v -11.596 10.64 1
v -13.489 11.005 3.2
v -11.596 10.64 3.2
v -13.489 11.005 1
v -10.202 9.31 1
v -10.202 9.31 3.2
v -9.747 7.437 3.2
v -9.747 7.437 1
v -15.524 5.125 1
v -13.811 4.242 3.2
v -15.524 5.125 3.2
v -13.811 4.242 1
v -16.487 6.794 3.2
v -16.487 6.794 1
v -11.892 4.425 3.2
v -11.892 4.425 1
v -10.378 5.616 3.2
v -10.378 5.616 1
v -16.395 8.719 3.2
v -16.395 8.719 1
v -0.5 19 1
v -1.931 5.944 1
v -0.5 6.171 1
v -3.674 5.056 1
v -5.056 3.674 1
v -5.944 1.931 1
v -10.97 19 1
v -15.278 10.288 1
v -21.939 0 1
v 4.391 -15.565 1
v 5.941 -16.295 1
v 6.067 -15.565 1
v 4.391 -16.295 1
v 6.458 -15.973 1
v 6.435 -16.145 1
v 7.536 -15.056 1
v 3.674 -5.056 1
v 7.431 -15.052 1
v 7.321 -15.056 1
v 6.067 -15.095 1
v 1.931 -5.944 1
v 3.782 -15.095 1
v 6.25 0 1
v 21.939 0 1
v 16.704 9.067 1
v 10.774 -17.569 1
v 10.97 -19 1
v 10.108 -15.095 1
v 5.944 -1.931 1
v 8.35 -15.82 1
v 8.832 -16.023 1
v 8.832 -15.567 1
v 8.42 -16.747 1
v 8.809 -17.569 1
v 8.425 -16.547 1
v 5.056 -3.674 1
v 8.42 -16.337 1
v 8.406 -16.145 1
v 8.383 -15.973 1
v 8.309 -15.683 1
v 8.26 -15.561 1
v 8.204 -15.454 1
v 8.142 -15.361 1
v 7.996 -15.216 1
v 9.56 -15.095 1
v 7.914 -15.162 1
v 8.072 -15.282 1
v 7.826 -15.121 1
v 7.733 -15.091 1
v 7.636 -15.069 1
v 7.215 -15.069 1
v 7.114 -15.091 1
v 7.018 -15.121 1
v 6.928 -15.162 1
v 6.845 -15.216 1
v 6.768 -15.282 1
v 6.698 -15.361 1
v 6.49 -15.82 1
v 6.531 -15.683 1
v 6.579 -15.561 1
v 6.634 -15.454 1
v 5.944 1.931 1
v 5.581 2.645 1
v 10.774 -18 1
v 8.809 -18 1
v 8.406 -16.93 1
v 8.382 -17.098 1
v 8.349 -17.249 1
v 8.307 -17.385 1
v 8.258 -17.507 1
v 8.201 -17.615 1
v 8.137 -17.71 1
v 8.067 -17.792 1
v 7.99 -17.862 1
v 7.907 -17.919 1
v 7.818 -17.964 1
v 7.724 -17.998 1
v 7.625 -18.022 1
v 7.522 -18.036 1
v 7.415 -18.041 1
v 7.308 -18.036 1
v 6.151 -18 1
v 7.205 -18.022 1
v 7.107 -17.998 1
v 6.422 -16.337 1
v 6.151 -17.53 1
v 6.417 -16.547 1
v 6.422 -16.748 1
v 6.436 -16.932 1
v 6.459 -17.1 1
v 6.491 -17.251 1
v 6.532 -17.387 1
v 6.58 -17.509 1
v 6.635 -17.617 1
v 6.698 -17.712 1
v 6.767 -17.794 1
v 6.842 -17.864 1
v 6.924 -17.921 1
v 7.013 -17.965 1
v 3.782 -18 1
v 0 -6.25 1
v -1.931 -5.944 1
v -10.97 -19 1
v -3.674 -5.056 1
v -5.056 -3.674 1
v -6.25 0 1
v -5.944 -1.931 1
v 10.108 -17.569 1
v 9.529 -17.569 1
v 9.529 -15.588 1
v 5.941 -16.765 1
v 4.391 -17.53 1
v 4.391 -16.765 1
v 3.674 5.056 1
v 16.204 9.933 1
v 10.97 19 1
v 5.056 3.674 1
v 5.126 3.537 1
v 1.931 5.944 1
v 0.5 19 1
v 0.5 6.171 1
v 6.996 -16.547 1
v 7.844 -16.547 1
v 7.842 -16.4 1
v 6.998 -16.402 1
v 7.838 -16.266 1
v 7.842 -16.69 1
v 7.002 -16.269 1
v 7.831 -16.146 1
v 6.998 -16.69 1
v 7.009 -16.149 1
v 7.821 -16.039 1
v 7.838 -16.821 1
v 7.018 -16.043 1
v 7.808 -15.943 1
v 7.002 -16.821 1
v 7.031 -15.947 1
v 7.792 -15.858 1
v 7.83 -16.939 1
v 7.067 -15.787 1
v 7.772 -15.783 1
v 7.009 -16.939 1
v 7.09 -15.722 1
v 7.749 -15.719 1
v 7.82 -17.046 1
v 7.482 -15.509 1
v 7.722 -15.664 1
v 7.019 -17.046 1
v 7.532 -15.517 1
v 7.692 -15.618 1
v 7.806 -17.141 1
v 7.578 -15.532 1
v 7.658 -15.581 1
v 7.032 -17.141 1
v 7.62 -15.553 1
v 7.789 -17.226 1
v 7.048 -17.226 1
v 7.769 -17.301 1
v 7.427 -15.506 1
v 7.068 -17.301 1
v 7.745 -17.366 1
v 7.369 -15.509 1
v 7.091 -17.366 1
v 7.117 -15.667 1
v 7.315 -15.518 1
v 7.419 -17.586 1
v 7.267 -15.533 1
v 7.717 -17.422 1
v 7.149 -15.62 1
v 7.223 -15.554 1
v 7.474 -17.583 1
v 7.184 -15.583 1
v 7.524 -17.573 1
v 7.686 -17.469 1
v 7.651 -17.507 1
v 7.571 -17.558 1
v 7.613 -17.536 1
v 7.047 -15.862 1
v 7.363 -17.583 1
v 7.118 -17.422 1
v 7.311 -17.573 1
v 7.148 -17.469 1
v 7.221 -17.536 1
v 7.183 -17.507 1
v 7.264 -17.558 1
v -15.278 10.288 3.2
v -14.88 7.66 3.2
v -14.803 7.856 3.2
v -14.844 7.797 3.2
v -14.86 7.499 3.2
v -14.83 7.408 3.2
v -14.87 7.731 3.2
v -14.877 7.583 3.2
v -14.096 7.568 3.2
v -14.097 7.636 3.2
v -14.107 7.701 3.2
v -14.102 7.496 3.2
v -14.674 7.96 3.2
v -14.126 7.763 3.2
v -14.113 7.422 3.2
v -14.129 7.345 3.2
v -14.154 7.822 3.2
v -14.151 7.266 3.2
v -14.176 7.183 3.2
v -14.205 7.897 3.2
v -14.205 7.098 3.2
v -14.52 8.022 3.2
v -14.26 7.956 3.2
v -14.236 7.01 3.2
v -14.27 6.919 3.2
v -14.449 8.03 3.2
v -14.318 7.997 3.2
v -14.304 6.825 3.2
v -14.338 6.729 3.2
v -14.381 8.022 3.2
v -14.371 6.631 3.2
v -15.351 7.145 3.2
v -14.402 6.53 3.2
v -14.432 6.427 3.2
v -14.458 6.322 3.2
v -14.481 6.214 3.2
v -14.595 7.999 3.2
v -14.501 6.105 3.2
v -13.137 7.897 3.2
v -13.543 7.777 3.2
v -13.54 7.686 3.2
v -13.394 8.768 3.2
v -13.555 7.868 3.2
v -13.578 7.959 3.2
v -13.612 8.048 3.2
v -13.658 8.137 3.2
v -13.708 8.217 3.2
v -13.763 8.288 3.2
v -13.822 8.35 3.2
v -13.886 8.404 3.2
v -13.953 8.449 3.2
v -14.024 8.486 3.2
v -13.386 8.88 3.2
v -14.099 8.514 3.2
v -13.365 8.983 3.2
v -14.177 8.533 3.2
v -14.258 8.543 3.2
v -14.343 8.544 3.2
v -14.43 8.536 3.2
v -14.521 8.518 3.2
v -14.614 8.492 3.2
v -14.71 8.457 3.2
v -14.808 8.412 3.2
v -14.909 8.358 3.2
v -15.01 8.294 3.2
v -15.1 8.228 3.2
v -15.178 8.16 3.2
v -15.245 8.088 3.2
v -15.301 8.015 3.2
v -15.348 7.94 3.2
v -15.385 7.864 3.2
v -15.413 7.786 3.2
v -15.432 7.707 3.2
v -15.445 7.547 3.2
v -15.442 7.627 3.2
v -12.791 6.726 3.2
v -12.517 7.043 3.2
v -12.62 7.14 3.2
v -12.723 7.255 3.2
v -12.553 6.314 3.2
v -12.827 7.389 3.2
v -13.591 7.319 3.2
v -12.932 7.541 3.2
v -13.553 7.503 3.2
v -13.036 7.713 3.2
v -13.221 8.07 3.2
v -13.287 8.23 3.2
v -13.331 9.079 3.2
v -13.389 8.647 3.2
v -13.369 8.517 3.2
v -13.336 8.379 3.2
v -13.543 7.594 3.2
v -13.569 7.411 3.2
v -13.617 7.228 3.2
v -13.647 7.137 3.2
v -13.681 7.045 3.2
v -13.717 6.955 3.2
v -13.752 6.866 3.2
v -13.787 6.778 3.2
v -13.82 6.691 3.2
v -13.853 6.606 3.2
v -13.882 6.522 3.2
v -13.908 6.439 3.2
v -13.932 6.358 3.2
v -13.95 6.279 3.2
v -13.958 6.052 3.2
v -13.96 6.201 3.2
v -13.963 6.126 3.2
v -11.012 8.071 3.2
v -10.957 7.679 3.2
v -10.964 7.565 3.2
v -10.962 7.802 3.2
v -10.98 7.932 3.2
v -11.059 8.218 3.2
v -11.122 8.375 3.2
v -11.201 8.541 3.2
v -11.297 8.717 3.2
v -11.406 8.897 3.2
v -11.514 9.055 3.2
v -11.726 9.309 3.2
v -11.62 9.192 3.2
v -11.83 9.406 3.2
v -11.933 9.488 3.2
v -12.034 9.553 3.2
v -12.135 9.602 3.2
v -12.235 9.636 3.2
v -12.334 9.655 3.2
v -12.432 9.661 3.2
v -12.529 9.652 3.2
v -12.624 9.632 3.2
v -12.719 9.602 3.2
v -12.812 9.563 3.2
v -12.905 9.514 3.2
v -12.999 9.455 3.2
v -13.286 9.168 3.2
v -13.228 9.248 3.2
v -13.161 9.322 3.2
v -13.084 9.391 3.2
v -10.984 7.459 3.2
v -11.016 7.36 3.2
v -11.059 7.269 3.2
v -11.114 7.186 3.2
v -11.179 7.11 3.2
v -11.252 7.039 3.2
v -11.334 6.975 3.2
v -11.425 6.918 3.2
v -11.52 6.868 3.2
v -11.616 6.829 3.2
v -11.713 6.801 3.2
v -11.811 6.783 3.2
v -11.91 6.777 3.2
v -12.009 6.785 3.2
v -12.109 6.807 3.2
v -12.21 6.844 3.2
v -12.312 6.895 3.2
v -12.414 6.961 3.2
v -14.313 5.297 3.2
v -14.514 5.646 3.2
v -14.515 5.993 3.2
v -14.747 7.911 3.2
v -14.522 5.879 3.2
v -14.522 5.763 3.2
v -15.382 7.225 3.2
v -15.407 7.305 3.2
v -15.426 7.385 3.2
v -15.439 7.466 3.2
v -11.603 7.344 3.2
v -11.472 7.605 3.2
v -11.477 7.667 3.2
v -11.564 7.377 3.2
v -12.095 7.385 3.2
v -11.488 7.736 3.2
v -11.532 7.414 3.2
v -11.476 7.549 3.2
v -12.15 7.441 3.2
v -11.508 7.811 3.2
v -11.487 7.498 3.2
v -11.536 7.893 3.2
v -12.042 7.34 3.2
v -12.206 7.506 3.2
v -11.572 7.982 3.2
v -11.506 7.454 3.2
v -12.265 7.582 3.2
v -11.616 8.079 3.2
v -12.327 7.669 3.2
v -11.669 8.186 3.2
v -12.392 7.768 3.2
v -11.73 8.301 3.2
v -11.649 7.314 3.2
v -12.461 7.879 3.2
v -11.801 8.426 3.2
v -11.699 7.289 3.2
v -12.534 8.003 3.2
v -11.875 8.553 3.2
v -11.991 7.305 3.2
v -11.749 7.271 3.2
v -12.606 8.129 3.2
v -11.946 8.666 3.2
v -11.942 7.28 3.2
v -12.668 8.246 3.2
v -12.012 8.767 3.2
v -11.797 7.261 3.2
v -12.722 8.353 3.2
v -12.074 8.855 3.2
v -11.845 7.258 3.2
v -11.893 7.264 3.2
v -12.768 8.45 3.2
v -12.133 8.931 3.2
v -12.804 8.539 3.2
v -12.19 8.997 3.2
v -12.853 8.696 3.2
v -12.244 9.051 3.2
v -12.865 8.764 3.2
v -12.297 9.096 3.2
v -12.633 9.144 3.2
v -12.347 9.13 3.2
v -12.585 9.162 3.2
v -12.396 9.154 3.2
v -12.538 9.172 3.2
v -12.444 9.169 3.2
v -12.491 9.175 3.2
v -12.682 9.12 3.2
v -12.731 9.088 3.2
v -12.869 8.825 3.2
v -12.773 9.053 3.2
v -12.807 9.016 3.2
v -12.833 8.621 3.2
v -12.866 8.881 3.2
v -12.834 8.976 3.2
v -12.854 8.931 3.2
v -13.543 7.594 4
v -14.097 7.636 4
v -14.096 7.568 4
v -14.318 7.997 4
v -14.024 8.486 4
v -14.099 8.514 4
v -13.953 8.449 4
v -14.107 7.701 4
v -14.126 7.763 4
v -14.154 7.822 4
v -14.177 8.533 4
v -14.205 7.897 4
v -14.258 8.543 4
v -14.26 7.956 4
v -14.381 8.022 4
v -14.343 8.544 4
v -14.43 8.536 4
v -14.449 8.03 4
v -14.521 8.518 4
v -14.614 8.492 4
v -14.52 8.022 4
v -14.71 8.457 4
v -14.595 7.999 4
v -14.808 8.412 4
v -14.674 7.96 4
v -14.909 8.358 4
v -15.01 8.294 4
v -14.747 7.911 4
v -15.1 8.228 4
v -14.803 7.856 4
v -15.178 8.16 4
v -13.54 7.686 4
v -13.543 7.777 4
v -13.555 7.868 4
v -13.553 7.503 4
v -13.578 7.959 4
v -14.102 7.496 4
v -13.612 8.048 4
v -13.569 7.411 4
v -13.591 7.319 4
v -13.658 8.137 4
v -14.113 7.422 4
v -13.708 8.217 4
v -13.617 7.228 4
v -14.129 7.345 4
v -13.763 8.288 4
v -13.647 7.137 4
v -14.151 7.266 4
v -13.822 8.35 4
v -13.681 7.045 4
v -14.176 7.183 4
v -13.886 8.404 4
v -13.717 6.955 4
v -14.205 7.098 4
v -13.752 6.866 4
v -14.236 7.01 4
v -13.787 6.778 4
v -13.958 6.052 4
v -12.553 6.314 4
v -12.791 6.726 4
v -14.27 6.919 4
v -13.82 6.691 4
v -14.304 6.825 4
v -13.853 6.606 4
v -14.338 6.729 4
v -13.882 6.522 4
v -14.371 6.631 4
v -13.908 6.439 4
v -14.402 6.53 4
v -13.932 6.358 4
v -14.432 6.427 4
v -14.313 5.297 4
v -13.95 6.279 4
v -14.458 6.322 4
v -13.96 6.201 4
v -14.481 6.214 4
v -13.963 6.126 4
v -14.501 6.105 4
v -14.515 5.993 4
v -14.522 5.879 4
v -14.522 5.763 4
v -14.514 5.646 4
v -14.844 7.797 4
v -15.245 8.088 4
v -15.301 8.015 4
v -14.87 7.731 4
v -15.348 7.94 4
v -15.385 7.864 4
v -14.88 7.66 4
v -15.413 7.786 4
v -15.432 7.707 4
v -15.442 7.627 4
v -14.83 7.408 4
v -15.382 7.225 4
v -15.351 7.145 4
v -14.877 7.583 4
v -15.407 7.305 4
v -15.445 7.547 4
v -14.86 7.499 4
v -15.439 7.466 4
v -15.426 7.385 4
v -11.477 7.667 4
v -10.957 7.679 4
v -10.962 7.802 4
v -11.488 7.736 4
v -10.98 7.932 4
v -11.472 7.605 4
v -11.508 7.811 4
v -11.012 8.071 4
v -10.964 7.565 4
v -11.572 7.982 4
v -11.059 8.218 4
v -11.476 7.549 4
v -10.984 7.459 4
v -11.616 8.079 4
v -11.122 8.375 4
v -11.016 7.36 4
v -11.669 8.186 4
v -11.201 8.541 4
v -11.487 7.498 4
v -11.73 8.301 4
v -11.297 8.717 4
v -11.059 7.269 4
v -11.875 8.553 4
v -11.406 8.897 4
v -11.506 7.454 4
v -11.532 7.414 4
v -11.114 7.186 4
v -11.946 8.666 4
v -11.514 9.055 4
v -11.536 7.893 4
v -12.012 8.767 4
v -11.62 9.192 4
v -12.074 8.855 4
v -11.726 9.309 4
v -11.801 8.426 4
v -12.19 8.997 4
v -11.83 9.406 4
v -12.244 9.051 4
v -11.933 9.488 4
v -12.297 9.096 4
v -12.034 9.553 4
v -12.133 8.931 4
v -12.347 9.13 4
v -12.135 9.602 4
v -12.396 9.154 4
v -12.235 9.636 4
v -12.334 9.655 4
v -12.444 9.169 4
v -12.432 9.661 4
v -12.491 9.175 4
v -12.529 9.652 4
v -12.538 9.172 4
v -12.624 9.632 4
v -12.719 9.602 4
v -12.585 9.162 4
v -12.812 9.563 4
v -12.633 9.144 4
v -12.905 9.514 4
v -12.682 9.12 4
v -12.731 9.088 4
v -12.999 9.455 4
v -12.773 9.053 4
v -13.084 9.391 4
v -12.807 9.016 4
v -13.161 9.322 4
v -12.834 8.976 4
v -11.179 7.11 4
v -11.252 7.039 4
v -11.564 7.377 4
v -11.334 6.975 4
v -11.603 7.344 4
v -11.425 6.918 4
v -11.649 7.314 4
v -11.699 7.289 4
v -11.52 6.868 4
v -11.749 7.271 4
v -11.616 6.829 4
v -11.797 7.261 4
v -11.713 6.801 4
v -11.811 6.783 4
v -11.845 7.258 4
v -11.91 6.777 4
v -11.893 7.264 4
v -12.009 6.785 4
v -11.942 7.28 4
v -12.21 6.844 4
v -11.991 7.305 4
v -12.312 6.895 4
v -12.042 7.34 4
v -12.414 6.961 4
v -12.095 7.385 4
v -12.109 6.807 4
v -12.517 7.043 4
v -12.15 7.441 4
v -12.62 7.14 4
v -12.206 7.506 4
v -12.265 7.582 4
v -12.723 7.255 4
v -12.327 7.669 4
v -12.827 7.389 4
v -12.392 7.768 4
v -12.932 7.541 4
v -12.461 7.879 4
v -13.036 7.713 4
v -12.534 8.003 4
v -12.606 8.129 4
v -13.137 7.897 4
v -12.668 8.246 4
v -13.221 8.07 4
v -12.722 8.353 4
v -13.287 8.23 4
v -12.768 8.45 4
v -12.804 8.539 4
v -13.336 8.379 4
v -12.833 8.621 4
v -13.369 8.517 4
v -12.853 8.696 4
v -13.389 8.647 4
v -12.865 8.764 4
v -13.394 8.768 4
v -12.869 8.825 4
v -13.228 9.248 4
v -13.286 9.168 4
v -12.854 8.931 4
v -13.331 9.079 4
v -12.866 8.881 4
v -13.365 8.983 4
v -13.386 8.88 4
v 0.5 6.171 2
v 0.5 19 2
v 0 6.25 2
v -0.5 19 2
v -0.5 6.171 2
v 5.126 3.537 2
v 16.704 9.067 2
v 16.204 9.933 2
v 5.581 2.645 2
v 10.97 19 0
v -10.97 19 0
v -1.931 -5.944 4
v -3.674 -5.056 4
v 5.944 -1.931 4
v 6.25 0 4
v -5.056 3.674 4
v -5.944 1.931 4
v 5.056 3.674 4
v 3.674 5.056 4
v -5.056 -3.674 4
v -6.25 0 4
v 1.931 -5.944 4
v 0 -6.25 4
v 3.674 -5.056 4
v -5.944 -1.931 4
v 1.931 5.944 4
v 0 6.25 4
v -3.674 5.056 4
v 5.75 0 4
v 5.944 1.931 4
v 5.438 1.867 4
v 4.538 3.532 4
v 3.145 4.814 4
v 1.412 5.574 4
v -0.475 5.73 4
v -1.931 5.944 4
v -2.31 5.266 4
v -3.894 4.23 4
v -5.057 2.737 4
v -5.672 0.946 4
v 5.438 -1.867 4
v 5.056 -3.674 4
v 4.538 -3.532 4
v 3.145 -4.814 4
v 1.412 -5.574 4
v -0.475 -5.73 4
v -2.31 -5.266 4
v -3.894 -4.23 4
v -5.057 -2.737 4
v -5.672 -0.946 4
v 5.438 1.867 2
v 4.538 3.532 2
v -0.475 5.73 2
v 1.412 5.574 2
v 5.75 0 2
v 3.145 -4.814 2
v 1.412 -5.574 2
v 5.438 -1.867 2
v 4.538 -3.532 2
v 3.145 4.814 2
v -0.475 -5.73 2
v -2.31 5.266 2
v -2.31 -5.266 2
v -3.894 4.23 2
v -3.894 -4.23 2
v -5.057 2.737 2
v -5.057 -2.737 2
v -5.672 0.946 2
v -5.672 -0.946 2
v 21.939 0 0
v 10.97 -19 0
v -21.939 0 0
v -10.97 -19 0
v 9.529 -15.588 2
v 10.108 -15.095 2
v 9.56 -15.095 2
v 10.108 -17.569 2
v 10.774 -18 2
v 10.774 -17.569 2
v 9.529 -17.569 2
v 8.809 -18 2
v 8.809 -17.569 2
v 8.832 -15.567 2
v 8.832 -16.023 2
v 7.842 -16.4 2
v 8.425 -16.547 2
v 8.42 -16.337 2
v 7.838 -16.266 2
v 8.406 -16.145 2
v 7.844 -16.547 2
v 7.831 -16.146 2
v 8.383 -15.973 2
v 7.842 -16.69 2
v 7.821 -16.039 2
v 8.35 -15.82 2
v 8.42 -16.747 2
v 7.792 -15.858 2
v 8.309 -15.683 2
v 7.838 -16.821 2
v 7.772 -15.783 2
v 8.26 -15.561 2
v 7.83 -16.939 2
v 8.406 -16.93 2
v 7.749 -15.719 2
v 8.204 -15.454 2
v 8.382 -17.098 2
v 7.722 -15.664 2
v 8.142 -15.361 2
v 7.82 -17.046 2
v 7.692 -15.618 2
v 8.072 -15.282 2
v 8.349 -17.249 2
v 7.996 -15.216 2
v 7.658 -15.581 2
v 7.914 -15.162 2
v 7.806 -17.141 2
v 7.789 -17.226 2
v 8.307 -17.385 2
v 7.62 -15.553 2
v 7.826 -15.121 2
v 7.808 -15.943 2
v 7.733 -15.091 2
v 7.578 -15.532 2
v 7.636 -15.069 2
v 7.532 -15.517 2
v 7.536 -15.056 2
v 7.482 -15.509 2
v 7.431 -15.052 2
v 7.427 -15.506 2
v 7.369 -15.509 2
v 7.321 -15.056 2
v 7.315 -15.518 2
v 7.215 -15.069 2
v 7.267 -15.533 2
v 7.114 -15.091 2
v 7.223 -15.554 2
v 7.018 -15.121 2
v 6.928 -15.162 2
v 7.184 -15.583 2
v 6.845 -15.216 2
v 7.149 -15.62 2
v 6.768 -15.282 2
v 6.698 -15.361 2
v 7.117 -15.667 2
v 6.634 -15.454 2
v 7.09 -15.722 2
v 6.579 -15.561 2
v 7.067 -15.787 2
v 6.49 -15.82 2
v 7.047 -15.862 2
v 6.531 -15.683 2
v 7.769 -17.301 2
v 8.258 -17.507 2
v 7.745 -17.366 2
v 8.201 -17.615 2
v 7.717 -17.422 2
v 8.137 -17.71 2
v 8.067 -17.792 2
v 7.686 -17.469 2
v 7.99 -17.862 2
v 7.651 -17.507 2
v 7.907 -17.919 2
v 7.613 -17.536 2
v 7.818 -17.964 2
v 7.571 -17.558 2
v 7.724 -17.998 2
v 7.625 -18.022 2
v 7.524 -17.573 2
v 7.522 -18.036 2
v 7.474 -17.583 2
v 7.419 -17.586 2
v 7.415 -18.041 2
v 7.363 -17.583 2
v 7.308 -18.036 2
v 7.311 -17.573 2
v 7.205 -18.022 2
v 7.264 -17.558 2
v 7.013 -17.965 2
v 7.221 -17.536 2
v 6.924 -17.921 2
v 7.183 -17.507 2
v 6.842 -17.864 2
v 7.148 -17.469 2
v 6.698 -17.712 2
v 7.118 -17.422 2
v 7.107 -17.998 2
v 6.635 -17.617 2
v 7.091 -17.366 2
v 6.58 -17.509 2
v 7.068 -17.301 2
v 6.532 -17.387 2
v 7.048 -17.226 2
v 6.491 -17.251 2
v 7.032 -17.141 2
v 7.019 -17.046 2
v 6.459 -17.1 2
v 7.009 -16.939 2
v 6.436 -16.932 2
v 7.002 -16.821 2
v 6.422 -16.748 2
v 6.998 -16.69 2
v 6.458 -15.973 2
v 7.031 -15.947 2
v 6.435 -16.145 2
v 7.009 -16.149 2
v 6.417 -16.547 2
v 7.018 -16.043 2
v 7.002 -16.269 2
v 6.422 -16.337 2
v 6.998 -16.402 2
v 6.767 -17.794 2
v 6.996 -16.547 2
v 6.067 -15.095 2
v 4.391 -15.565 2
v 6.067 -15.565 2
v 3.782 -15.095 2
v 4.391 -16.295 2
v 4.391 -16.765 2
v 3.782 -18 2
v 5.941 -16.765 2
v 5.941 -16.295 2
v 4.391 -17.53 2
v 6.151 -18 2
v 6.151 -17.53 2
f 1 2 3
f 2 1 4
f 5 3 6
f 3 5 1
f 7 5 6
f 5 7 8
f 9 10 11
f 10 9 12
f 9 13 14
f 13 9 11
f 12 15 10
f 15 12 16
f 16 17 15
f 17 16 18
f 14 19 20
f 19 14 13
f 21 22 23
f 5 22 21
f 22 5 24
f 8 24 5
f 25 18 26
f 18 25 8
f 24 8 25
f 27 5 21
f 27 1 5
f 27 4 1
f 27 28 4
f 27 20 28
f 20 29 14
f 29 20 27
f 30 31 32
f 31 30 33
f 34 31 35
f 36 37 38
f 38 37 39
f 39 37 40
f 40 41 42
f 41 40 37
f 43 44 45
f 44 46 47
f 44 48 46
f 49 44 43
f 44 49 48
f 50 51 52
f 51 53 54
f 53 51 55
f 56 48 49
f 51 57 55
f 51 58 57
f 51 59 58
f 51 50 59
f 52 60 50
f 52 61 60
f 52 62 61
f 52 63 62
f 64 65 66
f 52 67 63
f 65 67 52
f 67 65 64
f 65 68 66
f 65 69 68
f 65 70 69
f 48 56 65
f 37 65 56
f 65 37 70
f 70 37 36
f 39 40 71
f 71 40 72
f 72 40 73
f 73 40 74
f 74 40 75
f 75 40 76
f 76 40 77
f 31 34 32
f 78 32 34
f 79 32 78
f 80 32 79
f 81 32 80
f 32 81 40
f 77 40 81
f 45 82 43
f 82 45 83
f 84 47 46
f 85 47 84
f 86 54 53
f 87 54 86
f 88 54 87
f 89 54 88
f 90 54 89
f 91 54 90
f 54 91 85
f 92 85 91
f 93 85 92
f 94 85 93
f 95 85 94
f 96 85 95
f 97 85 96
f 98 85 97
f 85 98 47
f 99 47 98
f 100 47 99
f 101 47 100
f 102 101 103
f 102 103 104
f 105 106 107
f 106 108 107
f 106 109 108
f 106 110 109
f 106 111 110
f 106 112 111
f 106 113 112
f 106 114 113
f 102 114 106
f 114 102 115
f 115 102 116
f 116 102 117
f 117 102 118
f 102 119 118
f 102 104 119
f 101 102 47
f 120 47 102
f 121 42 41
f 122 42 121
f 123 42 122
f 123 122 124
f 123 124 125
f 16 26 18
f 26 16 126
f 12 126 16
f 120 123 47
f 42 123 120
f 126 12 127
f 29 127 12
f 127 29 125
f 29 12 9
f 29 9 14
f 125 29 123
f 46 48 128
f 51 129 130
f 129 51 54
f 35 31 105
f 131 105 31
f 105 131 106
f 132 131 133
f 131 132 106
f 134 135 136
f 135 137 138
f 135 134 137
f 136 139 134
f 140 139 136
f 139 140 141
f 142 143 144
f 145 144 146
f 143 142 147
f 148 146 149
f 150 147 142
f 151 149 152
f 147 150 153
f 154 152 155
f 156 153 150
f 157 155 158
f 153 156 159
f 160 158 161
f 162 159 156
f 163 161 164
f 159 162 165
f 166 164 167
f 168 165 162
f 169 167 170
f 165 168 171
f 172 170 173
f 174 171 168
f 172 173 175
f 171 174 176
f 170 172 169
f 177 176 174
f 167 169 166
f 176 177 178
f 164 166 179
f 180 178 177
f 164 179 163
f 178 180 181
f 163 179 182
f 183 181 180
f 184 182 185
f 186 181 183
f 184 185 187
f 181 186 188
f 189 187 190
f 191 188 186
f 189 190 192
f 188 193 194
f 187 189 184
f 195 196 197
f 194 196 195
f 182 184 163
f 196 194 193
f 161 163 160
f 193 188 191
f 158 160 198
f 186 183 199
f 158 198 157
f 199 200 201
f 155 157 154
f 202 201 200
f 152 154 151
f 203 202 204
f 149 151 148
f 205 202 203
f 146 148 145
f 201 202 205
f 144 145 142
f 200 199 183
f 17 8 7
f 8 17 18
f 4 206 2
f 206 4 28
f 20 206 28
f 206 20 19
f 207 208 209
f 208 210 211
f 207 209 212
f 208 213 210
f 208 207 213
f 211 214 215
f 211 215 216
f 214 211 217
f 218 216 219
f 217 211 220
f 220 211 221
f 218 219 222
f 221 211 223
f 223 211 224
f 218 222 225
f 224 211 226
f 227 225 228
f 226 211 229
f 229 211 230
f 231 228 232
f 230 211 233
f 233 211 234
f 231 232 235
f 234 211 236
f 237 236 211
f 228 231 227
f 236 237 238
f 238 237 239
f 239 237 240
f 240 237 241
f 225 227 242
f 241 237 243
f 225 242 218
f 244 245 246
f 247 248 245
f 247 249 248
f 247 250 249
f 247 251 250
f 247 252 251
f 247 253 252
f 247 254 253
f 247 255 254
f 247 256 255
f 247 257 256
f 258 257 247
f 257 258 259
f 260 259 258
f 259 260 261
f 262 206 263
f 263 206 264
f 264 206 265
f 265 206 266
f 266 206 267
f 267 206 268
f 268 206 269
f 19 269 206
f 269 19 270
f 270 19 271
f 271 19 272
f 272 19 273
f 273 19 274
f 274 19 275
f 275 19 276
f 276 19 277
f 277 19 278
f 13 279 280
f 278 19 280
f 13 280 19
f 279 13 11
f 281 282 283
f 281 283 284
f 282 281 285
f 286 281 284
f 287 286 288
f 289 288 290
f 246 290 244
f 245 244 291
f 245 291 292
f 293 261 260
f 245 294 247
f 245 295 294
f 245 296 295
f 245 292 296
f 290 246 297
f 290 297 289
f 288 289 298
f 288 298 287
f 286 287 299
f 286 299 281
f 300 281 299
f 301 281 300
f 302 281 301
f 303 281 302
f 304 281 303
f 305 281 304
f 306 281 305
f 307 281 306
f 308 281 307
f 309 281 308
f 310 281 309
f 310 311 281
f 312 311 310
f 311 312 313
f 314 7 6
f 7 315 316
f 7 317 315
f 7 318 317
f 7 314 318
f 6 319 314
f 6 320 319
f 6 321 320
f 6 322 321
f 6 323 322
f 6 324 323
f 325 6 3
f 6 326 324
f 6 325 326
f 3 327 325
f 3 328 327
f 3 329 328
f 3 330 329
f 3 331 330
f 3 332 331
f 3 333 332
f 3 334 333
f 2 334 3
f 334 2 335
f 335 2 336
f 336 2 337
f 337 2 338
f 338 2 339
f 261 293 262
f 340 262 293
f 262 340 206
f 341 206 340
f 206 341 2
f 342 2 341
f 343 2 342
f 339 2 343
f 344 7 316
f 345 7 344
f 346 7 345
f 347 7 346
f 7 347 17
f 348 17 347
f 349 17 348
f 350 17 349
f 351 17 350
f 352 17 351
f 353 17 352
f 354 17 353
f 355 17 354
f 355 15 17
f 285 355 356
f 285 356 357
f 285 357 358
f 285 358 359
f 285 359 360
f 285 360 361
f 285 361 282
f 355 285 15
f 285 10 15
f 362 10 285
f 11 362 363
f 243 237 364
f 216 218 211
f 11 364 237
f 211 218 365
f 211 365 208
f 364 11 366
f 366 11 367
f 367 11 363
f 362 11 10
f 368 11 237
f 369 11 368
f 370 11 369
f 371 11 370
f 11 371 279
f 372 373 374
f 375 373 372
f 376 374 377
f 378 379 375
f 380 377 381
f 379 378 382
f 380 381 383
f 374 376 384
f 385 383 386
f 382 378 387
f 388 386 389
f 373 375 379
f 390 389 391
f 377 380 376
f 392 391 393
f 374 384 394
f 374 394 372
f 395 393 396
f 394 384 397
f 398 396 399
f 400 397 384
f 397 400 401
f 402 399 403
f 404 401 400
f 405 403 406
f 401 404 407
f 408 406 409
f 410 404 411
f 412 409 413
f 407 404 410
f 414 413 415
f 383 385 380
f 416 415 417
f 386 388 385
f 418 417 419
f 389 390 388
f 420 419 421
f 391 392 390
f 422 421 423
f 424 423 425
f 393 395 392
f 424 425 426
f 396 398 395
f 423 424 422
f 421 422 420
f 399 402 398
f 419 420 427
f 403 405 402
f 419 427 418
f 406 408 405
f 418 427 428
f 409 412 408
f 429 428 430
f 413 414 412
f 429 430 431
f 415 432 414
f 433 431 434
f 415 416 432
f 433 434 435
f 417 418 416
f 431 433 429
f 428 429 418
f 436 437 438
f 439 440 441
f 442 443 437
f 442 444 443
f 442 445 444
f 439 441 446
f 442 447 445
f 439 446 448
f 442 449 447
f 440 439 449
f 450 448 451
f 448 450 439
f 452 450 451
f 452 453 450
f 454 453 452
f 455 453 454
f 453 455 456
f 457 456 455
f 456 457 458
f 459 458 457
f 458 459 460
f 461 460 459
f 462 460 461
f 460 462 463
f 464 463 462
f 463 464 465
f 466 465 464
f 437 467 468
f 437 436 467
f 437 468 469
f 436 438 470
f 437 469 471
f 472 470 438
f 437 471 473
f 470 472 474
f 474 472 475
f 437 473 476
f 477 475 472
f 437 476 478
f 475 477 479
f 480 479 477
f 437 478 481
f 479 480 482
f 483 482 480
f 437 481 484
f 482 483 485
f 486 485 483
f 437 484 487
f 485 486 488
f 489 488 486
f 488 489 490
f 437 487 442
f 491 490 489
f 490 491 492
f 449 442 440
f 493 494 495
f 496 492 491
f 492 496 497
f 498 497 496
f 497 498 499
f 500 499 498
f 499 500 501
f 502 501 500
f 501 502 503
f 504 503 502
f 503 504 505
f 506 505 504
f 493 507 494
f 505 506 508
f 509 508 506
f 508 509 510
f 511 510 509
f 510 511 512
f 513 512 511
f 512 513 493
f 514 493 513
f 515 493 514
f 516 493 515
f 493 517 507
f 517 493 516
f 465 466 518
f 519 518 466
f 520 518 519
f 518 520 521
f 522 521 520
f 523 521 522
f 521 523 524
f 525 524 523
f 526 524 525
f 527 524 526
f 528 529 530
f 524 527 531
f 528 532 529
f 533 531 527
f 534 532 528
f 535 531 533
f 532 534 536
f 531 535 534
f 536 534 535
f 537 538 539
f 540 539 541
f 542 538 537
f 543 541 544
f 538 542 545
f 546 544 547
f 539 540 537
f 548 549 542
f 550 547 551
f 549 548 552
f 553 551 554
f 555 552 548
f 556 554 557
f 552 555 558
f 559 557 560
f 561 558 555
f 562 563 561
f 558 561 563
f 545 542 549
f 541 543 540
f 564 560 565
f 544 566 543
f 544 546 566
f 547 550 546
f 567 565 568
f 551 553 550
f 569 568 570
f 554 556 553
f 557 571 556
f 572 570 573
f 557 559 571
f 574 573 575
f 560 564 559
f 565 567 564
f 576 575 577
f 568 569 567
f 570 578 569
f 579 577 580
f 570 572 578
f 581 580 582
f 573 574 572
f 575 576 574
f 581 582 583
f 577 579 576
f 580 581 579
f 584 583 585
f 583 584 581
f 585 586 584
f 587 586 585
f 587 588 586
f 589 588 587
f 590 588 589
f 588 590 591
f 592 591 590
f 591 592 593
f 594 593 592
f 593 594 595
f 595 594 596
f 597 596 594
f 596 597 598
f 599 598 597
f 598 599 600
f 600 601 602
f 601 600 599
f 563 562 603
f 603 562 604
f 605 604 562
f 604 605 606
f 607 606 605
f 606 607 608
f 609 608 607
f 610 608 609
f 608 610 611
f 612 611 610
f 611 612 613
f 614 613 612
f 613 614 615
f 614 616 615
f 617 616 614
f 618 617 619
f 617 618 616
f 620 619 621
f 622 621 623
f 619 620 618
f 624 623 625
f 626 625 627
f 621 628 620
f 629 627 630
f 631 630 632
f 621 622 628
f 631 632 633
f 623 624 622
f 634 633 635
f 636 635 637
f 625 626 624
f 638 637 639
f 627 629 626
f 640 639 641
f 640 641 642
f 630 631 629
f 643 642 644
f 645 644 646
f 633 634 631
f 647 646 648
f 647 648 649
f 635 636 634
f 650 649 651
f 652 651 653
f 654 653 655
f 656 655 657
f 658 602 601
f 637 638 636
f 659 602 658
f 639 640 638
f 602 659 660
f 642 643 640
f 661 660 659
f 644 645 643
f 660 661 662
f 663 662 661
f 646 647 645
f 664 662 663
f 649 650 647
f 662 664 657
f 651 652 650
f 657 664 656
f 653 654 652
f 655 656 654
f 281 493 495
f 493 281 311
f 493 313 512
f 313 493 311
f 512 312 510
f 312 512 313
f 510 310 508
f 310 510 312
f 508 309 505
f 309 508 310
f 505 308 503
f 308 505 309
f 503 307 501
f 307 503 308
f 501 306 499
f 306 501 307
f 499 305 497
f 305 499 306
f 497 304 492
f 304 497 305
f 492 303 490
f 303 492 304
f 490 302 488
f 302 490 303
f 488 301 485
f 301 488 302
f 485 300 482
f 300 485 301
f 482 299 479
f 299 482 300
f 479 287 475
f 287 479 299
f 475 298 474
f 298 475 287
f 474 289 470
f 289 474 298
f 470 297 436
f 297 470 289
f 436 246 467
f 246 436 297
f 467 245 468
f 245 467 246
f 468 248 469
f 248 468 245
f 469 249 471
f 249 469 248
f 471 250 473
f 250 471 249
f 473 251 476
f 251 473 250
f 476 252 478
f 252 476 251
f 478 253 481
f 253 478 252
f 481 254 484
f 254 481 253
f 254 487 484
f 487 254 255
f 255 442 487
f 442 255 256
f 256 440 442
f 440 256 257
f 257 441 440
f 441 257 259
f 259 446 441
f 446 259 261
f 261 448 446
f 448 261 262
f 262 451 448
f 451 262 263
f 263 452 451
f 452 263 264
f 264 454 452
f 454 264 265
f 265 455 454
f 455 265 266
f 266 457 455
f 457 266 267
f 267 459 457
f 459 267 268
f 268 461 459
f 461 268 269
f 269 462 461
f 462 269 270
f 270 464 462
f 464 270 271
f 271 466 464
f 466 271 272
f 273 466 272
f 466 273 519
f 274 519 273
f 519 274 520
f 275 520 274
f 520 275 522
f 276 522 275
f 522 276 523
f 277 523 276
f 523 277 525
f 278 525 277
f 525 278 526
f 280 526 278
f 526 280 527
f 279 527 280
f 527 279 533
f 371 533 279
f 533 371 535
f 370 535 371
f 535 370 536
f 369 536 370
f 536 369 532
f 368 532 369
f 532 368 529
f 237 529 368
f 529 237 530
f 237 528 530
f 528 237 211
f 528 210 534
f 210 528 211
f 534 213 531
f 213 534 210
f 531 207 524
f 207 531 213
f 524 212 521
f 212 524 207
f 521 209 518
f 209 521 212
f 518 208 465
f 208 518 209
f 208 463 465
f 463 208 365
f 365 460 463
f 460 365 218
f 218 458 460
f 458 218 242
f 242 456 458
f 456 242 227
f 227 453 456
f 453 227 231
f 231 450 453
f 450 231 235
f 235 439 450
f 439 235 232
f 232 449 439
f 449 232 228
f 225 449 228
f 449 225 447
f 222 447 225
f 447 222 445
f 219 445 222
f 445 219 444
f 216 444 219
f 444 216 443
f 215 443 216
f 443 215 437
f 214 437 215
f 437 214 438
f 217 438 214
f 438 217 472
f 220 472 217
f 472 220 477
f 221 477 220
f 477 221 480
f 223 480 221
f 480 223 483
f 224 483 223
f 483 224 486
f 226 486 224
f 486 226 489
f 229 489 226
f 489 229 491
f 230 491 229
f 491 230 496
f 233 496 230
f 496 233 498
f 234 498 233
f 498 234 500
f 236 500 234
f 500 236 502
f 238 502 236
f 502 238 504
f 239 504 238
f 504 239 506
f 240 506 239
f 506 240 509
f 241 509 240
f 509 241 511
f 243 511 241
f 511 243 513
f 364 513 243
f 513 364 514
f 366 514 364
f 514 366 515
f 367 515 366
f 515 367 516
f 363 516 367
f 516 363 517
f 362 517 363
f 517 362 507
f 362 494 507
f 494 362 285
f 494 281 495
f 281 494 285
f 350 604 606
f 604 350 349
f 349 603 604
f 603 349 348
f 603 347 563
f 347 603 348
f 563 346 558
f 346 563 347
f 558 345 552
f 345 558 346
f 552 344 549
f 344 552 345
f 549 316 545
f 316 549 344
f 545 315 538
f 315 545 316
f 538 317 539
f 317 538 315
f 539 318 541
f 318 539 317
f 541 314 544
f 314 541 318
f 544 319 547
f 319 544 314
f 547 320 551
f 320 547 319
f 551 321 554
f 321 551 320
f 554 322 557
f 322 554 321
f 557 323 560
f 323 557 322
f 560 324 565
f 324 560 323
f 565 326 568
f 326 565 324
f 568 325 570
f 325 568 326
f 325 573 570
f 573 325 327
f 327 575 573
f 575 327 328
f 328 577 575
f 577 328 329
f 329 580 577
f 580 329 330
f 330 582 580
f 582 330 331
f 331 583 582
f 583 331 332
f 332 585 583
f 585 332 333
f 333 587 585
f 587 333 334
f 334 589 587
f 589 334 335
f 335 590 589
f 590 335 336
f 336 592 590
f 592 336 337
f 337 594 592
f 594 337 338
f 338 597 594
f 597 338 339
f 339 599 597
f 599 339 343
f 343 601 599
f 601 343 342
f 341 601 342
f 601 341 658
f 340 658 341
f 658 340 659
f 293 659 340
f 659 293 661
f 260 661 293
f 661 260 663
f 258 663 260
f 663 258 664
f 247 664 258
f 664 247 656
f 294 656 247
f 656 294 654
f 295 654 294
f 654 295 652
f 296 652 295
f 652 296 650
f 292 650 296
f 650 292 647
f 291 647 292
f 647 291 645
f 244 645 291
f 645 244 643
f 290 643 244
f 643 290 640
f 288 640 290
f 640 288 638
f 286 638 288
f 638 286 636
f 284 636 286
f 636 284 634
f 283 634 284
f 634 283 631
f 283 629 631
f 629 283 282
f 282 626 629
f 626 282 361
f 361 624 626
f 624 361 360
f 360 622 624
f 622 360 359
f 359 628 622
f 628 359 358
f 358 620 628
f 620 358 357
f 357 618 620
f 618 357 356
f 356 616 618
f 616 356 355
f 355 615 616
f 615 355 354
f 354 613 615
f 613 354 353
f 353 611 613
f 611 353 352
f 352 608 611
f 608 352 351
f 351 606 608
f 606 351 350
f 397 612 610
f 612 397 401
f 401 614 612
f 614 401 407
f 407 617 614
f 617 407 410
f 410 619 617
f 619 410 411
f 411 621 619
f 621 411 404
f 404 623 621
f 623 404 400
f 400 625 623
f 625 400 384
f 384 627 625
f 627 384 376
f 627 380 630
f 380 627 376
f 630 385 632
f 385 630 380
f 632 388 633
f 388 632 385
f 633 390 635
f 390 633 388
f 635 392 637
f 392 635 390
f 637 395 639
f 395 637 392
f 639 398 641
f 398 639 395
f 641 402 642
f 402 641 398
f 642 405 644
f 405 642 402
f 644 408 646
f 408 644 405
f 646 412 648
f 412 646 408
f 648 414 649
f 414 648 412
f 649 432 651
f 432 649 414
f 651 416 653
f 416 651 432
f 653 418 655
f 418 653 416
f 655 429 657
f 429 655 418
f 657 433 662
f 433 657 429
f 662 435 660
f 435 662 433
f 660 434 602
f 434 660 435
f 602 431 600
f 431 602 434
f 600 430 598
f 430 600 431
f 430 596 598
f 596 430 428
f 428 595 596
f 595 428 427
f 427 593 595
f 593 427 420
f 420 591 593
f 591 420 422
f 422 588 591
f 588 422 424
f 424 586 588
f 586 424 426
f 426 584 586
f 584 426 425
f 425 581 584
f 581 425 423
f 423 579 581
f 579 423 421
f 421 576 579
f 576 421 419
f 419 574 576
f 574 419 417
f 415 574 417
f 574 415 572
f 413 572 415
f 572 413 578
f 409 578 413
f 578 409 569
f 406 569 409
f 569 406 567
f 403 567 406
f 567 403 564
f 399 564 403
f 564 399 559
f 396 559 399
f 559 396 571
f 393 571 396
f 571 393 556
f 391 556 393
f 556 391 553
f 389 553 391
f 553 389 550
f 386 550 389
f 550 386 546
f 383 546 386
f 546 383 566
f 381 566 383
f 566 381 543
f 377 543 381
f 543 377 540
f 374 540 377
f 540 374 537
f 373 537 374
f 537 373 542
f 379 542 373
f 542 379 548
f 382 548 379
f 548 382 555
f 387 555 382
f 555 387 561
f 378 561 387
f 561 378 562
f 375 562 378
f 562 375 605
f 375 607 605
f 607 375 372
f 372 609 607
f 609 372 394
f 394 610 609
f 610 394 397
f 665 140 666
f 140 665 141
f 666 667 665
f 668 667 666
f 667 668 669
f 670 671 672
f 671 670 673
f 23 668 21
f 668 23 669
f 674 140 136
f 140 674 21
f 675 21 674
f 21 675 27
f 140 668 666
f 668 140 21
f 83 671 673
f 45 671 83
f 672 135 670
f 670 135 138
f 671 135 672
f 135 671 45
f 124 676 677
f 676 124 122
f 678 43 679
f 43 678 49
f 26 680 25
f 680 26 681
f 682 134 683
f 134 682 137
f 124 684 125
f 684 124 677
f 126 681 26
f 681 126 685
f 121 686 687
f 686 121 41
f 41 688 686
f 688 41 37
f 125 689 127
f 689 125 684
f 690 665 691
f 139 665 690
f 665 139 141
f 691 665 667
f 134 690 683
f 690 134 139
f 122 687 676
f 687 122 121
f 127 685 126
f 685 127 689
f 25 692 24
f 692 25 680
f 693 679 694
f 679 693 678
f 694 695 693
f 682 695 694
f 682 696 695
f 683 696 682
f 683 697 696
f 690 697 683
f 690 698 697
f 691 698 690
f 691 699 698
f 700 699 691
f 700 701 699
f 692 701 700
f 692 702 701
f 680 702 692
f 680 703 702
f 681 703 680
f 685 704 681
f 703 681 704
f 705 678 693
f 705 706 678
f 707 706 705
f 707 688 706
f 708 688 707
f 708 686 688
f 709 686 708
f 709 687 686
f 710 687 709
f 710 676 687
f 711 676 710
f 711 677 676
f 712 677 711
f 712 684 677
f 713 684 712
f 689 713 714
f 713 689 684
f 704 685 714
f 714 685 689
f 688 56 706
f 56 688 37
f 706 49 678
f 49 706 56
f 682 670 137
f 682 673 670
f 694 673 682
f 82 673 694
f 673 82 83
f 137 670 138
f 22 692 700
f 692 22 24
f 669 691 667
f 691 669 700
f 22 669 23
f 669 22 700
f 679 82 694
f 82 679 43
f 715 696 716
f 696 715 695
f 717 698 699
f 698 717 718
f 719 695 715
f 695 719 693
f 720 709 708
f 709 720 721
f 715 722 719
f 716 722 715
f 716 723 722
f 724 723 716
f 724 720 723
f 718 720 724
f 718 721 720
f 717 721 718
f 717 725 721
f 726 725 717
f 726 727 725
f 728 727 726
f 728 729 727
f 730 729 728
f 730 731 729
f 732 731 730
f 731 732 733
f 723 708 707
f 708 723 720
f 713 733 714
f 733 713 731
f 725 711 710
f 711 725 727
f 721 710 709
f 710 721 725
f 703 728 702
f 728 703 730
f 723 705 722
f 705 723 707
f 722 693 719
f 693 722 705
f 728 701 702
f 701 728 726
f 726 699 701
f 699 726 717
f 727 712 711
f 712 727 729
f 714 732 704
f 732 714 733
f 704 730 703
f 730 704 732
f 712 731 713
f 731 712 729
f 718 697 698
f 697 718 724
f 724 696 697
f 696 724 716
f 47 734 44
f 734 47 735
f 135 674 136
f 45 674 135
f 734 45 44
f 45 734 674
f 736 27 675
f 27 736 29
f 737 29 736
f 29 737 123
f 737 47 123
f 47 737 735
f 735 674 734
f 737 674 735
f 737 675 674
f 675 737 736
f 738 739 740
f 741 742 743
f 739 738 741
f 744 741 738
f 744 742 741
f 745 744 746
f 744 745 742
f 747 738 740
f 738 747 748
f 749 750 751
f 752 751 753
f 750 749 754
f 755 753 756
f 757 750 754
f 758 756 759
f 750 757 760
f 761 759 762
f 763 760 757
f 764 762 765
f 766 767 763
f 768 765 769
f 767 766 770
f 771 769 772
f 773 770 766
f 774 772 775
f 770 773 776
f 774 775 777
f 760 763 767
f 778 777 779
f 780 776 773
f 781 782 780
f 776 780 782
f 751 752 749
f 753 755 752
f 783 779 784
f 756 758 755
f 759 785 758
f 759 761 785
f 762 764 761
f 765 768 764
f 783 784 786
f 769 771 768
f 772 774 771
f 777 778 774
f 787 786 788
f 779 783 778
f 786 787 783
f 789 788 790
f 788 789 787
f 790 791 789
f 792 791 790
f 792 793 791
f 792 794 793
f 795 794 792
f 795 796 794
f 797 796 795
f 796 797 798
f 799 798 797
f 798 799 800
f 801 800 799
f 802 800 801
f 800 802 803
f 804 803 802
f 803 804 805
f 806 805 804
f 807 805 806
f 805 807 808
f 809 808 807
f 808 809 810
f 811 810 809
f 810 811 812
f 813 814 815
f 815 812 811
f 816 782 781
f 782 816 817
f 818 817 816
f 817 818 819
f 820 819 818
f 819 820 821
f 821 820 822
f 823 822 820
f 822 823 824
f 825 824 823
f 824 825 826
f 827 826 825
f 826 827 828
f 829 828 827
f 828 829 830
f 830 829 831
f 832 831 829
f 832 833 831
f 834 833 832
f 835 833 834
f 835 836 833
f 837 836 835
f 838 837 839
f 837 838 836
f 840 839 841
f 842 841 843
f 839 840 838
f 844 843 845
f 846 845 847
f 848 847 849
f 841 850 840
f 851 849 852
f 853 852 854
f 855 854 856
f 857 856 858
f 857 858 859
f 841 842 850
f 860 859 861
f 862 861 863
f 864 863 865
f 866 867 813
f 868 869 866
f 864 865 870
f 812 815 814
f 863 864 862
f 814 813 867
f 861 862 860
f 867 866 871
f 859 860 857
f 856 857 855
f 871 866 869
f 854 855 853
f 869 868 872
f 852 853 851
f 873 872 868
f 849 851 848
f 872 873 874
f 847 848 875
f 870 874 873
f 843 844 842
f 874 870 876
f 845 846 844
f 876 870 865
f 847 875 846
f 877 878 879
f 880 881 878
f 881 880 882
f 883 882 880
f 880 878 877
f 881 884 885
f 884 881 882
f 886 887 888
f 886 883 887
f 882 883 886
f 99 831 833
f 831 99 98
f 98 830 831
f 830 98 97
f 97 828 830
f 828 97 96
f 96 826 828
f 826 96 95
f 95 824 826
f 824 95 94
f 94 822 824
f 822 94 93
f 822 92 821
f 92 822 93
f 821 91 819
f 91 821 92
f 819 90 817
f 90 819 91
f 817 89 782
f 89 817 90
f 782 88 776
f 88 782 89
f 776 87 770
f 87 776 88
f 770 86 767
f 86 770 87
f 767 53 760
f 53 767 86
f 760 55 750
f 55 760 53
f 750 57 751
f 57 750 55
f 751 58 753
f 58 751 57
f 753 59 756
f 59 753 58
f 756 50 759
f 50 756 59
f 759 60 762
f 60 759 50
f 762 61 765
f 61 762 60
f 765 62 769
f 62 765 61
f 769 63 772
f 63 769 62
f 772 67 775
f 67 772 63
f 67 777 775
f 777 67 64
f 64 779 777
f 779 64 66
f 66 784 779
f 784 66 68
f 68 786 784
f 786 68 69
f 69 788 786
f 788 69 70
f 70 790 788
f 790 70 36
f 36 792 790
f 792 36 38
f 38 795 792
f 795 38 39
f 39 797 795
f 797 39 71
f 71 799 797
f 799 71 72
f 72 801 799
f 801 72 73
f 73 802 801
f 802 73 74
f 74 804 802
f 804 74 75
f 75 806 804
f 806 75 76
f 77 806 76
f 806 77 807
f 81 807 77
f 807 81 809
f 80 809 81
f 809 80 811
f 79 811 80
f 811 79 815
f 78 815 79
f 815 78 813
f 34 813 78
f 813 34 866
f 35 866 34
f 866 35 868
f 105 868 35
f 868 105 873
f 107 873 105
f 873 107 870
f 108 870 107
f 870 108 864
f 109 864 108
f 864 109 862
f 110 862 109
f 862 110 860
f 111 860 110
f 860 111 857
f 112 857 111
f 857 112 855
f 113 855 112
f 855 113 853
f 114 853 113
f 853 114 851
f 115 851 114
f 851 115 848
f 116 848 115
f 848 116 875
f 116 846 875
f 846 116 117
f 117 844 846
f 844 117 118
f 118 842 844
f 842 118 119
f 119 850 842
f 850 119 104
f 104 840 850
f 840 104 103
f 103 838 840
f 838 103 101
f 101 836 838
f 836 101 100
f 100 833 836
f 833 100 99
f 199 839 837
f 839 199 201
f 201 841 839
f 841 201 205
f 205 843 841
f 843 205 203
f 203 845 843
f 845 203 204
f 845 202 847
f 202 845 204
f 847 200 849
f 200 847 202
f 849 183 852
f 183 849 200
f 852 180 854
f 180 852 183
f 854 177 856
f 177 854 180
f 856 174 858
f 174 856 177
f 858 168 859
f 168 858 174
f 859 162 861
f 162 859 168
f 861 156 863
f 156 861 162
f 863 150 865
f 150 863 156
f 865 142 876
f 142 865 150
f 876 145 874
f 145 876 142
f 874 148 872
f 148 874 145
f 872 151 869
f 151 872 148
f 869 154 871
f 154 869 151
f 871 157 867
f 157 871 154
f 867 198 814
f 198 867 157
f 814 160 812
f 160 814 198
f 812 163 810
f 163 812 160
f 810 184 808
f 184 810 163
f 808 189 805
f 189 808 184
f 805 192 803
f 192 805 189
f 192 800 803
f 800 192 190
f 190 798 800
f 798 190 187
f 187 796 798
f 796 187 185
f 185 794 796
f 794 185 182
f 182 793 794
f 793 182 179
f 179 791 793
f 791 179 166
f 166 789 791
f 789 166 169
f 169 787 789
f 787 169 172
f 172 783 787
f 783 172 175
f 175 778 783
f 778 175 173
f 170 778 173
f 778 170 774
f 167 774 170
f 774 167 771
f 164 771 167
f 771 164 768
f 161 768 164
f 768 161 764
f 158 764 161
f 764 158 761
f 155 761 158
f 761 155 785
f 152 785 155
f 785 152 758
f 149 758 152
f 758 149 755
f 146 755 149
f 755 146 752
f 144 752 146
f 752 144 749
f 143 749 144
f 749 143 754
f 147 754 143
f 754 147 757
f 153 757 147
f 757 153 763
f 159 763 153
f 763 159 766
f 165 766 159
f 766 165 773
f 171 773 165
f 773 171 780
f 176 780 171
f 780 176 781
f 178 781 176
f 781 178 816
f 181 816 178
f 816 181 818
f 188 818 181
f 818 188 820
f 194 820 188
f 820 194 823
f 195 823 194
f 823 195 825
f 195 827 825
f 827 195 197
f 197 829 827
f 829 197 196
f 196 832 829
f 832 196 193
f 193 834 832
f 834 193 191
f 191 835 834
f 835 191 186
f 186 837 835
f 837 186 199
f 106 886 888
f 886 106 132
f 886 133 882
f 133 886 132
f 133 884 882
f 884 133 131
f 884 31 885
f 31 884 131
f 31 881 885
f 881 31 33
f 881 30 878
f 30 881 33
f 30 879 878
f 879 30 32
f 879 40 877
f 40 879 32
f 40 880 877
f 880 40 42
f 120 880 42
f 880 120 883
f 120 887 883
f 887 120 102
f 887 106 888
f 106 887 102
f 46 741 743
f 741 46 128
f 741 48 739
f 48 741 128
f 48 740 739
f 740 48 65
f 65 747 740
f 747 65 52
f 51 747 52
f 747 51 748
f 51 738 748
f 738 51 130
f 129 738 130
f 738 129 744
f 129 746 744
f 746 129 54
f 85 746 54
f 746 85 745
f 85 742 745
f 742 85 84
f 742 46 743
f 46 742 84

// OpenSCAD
include <../../Scripts/18xx tiles basic functions.scad>
hex("blue");
put_tilenr("E01");
put_value_blue("20",-60);
single_city(v=[0,5]);
